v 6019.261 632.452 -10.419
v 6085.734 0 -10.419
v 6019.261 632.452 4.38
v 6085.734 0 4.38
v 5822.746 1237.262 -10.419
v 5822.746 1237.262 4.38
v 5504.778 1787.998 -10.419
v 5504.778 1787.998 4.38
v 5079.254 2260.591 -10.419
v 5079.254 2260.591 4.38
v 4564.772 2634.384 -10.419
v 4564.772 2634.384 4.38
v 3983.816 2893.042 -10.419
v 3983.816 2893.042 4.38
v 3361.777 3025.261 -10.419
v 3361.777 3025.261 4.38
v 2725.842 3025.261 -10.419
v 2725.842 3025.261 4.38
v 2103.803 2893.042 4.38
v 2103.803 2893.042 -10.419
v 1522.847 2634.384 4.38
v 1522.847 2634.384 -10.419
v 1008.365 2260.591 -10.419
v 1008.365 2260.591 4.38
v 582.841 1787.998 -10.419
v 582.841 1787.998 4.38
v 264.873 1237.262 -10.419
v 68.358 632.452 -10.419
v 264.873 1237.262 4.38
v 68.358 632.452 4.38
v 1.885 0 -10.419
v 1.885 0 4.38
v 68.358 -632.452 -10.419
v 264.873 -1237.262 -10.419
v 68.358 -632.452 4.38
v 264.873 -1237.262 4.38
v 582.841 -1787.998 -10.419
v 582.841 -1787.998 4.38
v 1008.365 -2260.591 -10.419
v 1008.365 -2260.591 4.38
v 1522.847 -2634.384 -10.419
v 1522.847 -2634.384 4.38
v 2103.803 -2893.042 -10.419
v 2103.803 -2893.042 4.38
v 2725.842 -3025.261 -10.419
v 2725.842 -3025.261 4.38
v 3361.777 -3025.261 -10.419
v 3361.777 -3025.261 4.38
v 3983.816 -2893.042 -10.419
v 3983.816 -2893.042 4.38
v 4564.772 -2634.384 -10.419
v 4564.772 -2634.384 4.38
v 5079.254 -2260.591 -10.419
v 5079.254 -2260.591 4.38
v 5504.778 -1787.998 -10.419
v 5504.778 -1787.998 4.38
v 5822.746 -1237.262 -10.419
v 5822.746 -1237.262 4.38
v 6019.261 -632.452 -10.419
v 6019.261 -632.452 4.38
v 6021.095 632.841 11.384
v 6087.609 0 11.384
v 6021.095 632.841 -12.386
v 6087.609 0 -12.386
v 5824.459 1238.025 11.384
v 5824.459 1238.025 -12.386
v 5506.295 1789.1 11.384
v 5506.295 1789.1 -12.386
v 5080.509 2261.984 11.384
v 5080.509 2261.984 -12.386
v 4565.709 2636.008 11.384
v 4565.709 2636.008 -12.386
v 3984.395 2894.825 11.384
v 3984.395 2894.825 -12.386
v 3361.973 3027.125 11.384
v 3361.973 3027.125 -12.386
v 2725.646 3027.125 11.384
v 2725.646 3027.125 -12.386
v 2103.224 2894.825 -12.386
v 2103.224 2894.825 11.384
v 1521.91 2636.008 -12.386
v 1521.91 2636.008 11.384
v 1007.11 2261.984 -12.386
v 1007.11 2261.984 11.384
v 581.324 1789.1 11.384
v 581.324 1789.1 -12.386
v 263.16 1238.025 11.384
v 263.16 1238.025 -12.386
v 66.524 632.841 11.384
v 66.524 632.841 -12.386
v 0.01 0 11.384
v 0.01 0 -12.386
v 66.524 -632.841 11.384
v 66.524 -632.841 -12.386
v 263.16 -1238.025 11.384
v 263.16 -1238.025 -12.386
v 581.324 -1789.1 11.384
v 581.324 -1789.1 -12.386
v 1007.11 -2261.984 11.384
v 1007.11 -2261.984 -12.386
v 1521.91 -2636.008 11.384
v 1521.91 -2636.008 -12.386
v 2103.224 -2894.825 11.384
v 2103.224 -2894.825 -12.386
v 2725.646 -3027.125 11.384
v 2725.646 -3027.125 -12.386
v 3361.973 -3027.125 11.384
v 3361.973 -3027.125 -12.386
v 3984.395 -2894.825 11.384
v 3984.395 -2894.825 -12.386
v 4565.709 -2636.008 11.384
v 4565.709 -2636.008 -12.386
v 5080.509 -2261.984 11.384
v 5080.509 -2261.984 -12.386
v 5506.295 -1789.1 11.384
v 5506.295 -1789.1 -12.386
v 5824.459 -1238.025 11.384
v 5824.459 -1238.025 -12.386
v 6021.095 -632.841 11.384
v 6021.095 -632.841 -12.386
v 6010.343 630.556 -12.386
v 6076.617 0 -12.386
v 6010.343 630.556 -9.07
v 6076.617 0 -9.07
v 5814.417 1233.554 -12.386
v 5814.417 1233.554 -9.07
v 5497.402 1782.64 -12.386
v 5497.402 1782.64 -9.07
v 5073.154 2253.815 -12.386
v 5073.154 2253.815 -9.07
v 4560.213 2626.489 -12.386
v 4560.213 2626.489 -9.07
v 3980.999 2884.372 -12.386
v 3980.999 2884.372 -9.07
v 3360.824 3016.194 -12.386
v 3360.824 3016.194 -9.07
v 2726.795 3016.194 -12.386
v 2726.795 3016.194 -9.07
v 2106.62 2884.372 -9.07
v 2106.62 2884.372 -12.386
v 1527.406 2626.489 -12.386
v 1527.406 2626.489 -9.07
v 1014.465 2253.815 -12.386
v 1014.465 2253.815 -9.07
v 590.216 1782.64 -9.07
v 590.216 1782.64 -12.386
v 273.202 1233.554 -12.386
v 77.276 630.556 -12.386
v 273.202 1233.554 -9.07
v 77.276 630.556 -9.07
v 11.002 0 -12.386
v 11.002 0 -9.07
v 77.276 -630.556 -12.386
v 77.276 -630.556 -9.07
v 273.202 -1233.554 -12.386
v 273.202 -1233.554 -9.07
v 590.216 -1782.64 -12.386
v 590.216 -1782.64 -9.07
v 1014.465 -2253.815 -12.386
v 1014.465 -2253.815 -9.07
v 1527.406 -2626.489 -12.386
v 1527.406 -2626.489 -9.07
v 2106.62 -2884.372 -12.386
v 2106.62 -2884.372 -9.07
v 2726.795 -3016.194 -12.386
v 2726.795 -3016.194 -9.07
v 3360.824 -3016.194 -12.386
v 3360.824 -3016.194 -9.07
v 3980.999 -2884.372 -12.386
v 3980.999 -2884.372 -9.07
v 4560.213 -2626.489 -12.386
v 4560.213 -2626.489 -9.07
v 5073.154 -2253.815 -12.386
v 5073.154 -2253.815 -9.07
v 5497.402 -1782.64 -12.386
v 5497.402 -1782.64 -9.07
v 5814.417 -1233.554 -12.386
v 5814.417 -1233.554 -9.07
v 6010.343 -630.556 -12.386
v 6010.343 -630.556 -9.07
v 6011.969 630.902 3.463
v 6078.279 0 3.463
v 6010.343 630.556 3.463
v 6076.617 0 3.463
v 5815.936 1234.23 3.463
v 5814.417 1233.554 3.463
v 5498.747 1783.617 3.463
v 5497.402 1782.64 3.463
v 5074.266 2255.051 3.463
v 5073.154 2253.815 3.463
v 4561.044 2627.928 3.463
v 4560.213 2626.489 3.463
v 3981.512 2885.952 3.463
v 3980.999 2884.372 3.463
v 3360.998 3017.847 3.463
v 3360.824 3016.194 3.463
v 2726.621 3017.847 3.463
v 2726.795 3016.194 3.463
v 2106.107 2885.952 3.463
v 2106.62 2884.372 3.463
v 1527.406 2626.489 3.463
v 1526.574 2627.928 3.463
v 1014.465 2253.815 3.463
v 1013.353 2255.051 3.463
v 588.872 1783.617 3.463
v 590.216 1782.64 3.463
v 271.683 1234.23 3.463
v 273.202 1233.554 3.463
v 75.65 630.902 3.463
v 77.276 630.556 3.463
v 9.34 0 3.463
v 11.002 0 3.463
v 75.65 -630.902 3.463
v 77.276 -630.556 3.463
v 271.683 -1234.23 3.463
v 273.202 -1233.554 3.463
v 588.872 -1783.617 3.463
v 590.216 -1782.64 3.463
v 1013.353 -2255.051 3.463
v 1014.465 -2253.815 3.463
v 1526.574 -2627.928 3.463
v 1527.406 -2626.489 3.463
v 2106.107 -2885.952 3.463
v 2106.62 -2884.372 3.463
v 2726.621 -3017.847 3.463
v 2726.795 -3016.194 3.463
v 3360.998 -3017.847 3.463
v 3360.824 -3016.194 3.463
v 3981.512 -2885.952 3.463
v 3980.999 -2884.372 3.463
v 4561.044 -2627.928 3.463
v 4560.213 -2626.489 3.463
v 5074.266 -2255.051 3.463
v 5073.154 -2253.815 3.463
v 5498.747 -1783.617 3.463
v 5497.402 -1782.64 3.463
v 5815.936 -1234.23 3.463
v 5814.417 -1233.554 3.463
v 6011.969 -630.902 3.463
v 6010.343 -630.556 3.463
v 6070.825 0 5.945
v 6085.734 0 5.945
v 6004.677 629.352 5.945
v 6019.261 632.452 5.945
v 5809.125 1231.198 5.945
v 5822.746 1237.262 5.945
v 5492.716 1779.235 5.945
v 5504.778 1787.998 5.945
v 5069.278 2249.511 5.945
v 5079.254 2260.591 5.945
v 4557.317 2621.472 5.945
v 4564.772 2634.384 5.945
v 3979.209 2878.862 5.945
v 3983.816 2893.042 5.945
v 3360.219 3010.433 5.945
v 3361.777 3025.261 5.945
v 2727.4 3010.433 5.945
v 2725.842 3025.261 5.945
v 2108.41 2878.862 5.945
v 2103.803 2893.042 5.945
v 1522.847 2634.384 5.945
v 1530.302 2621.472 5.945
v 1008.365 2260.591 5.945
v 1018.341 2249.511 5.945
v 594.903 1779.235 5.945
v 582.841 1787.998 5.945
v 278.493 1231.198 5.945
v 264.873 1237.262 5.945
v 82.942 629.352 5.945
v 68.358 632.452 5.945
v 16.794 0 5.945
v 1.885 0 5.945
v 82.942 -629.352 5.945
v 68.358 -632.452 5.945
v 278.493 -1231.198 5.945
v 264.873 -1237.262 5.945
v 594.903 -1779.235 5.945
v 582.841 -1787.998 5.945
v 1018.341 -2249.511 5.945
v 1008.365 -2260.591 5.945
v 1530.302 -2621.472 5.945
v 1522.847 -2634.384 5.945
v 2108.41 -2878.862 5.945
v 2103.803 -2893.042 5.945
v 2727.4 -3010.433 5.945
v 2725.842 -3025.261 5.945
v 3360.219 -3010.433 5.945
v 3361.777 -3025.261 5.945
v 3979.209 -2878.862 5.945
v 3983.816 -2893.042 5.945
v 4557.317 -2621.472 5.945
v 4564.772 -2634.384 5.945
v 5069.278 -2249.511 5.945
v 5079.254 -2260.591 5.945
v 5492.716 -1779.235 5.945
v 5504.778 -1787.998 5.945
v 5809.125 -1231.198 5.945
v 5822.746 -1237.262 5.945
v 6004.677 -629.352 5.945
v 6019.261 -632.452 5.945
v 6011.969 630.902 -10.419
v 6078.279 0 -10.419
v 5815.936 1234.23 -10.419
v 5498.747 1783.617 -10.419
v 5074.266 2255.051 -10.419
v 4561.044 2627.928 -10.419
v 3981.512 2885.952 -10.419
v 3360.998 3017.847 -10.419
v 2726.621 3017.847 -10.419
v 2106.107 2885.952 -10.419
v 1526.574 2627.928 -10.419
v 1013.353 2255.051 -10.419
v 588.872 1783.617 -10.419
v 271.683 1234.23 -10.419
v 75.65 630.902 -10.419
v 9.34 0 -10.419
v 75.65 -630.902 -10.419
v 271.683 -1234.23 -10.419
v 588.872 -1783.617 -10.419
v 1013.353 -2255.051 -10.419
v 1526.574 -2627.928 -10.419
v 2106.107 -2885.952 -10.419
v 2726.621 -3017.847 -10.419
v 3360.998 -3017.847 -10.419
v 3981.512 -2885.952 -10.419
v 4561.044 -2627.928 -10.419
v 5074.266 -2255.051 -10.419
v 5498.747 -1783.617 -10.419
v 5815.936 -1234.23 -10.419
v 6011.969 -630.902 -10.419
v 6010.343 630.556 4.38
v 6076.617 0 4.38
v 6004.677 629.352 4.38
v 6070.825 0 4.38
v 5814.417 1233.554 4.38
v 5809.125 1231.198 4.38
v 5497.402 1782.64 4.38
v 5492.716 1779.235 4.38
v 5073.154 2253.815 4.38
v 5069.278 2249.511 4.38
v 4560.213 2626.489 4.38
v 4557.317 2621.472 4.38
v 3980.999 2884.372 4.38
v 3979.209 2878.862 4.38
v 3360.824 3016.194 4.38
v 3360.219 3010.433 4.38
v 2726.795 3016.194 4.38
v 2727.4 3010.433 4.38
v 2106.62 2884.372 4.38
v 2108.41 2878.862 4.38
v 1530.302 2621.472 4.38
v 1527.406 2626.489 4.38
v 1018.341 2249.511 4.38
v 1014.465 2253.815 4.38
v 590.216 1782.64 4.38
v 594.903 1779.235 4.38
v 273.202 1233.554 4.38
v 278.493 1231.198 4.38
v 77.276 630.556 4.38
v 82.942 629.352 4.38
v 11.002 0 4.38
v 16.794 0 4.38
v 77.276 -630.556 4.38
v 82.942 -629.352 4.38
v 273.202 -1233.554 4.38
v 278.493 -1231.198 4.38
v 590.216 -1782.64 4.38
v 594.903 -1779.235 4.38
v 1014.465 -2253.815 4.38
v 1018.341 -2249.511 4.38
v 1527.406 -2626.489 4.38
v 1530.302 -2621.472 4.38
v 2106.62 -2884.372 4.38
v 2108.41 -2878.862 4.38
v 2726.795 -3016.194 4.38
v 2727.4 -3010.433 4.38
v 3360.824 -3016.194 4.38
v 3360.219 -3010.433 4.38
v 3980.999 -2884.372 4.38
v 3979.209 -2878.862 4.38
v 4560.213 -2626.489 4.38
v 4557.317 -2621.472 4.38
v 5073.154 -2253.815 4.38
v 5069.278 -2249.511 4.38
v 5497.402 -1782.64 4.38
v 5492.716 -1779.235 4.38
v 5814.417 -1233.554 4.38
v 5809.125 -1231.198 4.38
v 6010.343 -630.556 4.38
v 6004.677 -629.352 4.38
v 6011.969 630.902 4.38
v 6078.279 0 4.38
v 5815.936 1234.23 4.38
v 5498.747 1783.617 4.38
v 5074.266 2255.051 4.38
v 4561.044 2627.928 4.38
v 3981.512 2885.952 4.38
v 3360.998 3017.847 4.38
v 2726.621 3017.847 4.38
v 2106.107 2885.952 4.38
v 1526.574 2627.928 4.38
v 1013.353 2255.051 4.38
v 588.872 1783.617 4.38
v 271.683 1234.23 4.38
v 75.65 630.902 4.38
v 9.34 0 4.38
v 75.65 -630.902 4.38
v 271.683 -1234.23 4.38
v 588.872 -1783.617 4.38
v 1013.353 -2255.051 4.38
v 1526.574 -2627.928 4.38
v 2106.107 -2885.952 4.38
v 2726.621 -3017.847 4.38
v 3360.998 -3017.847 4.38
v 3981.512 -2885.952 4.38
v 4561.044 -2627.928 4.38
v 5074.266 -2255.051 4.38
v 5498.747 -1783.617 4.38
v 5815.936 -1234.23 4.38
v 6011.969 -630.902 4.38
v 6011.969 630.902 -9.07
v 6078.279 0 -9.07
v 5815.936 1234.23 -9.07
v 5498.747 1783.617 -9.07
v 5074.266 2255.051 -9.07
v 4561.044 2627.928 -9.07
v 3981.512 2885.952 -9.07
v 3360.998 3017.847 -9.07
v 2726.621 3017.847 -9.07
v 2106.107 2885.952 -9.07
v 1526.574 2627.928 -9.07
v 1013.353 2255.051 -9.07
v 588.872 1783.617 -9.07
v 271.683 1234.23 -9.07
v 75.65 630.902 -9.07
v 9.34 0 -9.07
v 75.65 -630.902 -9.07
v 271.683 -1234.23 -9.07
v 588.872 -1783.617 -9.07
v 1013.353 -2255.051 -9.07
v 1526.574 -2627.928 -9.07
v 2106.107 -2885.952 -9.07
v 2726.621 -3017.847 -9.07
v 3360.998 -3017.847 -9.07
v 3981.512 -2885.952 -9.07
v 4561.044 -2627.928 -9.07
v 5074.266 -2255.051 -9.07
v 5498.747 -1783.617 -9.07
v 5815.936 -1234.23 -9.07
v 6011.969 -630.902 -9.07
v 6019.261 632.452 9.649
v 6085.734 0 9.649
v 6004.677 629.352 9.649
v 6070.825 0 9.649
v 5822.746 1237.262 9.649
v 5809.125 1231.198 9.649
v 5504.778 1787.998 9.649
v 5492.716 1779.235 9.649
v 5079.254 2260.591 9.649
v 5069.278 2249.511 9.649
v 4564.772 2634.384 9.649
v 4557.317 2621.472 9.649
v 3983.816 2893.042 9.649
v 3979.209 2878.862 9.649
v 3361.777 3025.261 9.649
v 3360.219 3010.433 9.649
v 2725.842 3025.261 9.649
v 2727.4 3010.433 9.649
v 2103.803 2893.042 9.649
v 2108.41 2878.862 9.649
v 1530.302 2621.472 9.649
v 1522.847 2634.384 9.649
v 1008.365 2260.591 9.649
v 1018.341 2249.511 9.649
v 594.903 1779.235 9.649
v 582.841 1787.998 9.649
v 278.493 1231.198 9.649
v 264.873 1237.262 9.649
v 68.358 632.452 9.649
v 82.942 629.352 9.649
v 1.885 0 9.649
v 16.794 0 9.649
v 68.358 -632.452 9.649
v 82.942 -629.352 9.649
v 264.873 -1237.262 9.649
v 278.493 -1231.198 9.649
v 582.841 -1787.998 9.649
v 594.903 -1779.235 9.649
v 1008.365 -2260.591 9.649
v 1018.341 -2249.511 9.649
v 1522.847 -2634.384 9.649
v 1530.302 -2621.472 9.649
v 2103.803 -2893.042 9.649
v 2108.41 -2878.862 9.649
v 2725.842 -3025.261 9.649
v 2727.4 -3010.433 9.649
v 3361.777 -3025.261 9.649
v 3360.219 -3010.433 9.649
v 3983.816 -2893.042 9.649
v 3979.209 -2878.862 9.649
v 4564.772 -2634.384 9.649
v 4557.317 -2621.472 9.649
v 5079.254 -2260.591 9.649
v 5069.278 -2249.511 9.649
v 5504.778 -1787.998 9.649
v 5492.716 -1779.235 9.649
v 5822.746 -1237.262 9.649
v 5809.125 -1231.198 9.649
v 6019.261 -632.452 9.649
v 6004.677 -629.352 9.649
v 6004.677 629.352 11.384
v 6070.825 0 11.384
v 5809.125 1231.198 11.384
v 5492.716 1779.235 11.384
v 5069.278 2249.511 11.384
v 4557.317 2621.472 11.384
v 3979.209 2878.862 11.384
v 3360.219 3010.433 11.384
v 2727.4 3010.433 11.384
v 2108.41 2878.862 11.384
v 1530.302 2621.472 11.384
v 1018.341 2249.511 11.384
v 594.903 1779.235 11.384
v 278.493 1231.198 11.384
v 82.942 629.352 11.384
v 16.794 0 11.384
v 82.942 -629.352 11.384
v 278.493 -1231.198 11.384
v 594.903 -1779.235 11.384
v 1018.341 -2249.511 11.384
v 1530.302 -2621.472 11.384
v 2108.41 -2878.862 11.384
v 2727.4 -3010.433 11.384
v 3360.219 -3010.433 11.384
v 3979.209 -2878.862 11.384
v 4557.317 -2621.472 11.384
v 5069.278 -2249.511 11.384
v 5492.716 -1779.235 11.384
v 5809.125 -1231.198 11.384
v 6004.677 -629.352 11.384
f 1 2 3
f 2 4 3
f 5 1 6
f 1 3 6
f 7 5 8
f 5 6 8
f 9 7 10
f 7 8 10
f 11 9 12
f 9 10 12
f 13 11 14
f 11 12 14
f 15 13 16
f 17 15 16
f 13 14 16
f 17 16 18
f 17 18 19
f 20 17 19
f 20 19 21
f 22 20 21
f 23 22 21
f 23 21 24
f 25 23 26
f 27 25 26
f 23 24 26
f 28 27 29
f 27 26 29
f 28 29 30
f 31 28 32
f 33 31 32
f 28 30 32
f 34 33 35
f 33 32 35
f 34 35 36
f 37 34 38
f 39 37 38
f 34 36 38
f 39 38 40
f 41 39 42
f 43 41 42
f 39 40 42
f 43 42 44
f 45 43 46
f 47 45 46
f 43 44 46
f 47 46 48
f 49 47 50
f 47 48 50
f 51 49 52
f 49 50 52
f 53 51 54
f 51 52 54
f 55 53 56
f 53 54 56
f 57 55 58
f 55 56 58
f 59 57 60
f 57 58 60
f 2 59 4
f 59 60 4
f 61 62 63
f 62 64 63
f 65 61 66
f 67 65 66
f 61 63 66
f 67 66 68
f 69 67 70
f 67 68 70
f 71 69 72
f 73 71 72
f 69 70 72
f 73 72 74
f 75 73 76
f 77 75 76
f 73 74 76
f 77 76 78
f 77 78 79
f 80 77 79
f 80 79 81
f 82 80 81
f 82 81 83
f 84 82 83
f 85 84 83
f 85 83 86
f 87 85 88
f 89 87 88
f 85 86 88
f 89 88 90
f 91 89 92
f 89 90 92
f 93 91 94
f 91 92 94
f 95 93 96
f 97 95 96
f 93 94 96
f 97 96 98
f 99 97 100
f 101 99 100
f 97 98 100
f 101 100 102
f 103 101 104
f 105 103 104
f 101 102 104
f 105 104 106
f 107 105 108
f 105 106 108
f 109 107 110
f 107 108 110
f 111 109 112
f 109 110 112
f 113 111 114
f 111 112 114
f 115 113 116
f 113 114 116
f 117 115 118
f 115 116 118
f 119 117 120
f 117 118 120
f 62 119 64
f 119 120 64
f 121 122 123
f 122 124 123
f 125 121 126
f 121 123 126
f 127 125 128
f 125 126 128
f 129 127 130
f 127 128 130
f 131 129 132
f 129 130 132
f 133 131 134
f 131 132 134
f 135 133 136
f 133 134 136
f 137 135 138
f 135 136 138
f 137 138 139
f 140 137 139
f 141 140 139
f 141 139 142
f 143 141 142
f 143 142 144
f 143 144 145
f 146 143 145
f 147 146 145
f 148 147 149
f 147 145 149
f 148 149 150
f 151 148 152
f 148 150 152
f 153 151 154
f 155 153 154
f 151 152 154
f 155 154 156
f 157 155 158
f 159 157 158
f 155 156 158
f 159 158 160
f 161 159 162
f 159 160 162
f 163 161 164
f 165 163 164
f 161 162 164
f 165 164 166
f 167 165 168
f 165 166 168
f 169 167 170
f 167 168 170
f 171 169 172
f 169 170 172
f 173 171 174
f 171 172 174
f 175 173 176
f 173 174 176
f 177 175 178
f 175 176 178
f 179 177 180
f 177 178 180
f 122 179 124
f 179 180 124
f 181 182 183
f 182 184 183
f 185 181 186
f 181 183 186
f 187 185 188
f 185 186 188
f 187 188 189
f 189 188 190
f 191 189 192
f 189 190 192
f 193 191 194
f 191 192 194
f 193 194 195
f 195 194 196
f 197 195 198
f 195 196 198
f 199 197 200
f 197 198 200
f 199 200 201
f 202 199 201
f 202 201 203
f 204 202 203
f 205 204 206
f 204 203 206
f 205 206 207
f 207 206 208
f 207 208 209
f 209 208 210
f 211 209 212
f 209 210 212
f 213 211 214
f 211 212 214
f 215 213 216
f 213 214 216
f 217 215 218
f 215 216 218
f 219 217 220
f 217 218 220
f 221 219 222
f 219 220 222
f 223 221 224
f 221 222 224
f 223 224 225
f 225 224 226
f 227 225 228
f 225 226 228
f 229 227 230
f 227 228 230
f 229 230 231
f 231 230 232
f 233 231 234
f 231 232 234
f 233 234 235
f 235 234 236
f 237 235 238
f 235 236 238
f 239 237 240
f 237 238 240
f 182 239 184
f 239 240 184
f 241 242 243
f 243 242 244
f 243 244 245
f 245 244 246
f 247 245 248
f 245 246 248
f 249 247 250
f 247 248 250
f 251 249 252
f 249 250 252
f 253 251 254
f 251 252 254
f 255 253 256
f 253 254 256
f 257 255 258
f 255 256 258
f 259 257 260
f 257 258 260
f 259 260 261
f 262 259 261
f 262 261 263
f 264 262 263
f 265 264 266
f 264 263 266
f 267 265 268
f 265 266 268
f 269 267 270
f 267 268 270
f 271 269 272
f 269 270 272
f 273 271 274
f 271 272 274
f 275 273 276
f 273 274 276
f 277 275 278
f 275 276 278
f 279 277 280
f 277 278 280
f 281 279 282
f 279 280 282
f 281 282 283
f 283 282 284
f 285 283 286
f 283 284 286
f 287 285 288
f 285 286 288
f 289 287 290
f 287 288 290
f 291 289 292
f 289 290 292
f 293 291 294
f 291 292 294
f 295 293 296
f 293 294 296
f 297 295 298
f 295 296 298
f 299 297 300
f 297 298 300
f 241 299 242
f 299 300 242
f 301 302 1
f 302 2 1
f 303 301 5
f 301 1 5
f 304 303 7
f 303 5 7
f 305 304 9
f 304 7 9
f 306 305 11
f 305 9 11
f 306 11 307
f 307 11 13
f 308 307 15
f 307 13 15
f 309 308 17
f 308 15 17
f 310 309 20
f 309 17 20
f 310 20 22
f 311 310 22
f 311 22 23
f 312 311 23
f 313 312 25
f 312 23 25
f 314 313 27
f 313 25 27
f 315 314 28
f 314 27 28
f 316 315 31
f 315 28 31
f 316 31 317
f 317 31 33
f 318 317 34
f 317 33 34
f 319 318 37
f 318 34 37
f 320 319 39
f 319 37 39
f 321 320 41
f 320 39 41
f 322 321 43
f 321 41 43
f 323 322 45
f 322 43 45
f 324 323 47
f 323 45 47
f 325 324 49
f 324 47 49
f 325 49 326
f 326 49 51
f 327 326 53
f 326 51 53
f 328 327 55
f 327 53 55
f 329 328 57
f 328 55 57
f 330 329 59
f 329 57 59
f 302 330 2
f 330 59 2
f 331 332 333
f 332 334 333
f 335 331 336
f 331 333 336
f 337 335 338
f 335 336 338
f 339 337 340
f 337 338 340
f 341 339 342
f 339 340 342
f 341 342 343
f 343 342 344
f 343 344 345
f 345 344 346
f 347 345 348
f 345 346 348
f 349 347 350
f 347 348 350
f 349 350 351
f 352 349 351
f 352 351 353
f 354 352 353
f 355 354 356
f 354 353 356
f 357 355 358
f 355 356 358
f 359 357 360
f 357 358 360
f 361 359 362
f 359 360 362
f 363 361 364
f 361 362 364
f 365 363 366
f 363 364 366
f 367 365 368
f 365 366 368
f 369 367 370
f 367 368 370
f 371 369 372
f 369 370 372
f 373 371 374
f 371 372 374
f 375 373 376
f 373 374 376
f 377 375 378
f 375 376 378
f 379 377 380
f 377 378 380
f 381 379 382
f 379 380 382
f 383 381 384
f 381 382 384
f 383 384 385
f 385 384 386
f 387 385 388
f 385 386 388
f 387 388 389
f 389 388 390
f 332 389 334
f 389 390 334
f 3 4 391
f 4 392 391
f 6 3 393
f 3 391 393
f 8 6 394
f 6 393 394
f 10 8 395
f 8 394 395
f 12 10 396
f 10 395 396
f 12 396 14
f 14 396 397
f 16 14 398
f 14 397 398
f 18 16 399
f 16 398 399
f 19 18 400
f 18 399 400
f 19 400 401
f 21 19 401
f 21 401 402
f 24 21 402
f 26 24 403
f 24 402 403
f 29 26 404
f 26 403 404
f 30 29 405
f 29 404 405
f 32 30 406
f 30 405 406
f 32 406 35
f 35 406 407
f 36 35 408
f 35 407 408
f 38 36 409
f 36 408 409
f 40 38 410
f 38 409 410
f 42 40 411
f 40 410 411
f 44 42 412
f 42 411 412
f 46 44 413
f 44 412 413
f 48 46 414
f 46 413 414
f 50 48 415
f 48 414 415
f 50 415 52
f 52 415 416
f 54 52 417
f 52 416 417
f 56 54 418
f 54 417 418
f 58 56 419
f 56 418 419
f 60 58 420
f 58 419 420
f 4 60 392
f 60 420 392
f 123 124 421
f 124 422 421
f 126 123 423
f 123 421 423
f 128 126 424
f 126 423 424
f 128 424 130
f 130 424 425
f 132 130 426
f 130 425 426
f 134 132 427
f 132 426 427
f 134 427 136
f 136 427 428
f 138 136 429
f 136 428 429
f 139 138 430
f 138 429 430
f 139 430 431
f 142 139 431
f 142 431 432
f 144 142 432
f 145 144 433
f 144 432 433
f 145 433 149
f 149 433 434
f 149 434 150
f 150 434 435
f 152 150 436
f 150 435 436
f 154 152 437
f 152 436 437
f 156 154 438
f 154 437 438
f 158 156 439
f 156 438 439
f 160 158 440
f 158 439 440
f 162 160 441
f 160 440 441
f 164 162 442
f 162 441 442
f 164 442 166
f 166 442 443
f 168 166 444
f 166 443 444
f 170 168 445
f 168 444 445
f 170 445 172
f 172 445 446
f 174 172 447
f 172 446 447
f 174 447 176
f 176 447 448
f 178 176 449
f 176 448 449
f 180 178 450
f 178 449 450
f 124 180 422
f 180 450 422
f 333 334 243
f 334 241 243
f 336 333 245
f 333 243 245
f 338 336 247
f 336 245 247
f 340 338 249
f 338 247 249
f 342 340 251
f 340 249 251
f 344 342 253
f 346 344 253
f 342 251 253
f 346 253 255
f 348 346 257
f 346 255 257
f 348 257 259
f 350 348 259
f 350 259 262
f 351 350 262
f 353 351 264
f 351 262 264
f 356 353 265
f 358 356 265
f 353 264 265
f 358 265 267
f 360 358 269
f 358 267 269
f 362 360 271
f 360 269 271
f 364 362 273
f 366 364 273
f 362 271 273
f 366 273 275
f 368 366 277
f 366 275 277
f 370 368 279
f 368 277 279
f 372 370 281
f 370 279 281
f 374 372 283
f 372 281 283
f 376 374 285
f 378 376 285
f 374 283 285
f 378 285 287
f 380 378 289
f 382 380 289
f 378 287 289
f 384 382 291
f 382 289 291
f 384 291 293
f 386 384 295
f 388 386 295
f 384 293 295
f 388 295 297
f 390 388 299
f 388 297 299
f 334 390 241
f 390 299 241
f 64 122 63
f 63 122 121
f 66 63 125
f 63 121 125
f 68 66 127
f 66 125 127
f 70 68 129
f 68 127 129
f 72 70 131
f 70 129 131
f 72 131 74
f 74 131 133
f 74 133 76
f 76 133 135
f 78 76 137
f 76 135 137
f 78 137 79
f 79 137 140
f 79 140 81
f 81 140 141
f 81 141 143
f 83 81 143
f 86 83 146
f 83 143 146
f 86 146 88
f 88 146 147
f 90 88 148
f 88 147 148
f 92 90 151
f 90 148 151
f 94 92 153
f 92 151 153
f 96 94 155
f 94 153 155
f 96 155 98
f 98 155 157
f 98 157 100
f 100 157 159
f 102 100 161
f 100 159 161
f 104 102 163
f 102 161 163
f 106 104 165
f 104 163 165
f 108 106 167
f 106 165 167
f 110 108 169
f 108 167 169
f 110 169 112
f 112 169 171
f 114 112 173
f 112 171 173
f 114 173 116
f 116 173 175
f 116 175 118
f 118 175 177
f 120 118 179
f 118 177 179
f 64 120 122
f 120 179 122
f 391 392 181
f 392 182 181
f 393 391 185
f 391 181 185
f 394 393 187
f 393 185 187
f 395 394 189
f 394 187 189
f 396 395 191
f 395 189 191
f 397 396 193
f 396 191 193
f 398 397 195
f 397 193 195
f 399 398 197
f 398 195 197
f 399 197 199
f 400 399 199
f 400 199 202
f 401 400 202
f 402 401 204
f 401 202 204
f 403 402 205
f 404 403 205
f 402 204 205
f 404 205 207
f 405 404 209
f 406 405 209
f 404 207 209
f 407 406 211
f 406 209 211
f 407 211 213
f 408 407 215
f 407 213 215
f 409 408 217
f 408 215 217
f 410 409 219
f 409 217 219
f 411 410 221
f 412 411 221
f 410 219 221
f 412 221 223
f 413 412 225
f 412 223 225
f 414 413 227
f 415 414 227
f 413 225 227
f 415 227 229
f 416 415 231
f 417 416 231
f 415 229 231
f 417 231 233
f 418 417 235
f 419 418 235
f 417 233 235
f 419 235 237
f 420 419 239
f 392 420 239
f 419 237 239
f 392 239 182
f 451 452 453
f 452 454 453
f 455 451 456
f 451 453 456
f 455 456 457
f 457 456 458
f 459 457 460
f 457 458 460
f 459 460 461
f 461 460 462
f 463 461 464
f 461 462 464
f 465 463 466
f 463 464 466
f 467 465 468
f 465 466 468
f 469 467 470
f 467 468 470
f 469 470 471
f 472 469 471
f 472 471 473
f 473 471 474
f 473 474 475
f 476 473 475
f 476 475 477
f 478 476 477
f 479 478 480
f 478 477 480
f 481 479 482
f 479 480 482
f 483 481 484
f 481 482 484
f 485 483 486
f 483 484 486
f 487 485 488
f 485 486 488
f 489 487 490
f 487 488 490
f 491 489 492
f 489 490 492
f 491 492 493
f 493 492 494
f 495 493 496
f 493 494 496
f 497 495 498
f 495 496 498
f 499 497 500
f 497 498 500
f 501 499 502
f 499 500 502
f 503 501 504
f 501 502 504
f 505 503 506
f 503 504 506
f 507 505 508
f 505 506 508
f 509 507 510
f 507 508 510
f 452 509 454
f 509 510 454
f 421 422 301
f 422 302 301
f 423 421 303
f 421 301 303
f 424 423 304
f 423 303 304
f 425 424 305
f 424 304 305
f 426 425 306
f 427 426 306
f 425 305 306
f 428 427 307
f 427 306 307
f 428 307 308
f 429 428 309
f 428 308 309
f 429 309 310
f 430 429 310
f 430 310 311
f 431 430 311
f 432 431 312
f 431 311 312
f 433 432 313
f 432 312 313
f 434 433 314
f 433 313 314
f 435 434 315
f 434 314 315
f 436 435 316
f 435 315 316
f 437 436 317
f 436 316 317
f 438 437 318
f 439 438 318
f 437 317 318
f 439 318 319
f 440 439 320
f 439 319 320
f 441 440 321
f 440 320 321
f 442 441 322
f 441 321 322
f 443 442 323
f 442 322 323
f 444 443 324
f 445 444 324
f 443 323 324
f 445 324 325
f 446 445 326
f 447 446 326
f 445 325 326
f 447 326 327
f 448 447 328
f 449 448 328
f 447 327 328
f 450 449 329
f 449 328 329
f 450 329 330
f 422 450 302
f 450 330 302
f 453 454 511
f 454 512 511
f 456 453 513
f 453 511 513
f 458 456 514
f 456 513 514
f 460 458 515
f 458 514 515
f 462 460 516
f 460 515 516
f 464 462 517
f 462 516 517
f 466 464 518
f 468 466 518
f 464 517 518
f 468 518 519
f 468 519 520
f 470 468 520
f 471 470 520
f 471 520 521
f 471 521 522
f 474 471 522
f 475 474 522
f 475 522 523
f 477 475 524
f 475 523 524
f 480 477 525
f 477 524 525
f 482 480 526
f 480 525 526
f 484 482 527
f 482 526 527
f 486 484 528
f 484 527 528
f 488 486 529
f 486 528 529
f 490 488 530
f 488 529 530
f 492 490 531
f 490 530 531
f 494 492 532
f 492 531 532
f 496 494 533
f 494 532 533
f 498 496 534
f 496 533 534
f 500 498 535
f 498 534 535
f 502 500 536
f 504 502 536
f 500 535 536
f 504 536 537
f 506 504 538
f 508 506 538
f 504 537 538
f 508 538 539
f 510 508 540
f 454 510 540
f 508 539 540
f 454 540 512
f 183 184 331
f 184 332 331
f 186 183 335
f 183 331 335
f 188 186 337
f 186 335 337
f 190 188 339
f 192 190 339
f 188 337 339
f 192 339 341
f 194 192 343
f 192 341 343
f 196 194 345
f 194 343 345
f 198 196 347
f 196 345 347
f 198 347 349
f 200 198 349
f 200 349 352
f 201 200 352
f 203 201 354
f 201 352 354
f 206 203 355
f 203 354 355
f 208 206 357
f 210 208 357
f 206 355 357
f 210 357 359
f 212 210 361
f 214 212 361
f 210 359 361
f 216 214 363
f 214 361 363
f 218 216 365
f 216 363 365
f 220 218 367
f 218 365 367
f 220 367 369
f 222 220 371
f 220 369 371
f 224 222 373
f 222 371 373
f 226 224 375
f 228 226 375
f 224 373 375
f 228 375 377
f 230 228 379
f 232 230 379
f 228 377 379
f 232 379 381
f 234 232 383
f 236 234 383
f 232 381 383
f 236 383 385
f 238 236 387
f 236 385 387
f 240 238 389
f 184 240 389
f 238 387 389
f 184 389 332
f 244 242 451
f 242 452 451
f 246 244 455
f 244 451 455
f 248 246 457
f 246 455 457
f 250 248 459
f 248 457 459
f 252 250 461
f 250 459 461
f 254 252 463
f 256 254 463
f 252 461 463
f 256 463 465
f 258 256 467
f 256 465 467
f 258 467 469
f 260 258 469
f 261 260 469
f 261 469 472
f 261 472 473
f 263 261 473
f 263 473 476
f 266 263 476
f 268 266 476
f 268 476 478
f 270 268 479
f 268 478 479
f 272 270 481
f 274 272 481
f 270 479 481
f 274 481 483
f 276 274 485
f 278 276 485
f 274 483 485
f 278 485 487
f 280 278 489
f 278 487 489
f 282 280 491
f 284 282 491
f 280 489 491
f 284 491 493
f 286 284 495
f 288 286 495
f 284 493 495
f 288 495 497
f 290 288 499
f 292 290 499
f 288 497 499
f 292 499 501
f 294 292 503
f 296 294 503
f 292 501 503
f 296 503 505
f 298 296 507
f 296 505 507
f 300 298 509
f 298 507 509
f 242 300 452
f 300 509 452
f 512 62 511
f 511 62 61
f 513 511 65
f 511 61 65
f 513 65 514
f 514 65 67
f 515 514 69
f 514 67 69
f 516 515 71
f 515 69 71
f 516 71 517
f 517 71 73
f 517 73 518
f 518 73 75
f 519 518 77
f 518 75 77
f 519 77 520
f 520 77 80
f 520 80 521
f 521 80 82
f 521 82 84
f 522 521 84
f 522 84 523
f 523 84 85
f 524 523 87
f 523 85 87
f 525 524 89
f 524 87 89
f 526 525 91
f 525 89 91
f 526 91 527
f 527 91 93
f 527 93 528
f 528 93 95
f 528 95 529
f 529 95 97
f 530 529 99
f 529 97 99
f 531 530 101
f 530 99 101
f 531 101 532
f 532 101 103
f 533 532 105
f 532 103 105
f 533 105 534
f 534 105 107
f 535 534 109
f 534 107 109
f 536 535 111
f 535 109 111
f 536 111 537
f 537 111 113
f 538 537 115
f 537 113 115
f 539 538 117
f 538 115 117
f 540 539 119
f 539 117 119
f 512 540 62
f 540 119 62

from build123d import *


with BuildPart() as f2:
    # F2: sweep along a path in F1
    with BuildLine(Plane.XY) as f2_path:
        CenterArc((3043.809423, 0), 3045, 0, 360)
    # F0 (on Front) → F2 (sweep)
    with BuildSketch(Plane.XZ):
        Polygon((16.794275, 11.384281), (0.01, 11.384281), (0.01, -12.385881), (11.001622, -12.385881), (11.001622, -10.419134), (11.001622, -9.070487), (9.33952, -9.070487), (9.33952, -10.419134), (1.884766, -10.419134), (1.884766, 4.380418), (9.33952, 4.380418), (9.33952, 3.463338), (11.001622, 3.463338), (11.001622, 4.380418), (16.794275, 4.380418), (16.794275, 5.944849), (1.884766, 5.944849), (1.884766, 7.544847), (1.884766, 9.648737), (16.794275, 9.648737), align=None)
    sweep(path=f2_path.line)


solid = f2.part
